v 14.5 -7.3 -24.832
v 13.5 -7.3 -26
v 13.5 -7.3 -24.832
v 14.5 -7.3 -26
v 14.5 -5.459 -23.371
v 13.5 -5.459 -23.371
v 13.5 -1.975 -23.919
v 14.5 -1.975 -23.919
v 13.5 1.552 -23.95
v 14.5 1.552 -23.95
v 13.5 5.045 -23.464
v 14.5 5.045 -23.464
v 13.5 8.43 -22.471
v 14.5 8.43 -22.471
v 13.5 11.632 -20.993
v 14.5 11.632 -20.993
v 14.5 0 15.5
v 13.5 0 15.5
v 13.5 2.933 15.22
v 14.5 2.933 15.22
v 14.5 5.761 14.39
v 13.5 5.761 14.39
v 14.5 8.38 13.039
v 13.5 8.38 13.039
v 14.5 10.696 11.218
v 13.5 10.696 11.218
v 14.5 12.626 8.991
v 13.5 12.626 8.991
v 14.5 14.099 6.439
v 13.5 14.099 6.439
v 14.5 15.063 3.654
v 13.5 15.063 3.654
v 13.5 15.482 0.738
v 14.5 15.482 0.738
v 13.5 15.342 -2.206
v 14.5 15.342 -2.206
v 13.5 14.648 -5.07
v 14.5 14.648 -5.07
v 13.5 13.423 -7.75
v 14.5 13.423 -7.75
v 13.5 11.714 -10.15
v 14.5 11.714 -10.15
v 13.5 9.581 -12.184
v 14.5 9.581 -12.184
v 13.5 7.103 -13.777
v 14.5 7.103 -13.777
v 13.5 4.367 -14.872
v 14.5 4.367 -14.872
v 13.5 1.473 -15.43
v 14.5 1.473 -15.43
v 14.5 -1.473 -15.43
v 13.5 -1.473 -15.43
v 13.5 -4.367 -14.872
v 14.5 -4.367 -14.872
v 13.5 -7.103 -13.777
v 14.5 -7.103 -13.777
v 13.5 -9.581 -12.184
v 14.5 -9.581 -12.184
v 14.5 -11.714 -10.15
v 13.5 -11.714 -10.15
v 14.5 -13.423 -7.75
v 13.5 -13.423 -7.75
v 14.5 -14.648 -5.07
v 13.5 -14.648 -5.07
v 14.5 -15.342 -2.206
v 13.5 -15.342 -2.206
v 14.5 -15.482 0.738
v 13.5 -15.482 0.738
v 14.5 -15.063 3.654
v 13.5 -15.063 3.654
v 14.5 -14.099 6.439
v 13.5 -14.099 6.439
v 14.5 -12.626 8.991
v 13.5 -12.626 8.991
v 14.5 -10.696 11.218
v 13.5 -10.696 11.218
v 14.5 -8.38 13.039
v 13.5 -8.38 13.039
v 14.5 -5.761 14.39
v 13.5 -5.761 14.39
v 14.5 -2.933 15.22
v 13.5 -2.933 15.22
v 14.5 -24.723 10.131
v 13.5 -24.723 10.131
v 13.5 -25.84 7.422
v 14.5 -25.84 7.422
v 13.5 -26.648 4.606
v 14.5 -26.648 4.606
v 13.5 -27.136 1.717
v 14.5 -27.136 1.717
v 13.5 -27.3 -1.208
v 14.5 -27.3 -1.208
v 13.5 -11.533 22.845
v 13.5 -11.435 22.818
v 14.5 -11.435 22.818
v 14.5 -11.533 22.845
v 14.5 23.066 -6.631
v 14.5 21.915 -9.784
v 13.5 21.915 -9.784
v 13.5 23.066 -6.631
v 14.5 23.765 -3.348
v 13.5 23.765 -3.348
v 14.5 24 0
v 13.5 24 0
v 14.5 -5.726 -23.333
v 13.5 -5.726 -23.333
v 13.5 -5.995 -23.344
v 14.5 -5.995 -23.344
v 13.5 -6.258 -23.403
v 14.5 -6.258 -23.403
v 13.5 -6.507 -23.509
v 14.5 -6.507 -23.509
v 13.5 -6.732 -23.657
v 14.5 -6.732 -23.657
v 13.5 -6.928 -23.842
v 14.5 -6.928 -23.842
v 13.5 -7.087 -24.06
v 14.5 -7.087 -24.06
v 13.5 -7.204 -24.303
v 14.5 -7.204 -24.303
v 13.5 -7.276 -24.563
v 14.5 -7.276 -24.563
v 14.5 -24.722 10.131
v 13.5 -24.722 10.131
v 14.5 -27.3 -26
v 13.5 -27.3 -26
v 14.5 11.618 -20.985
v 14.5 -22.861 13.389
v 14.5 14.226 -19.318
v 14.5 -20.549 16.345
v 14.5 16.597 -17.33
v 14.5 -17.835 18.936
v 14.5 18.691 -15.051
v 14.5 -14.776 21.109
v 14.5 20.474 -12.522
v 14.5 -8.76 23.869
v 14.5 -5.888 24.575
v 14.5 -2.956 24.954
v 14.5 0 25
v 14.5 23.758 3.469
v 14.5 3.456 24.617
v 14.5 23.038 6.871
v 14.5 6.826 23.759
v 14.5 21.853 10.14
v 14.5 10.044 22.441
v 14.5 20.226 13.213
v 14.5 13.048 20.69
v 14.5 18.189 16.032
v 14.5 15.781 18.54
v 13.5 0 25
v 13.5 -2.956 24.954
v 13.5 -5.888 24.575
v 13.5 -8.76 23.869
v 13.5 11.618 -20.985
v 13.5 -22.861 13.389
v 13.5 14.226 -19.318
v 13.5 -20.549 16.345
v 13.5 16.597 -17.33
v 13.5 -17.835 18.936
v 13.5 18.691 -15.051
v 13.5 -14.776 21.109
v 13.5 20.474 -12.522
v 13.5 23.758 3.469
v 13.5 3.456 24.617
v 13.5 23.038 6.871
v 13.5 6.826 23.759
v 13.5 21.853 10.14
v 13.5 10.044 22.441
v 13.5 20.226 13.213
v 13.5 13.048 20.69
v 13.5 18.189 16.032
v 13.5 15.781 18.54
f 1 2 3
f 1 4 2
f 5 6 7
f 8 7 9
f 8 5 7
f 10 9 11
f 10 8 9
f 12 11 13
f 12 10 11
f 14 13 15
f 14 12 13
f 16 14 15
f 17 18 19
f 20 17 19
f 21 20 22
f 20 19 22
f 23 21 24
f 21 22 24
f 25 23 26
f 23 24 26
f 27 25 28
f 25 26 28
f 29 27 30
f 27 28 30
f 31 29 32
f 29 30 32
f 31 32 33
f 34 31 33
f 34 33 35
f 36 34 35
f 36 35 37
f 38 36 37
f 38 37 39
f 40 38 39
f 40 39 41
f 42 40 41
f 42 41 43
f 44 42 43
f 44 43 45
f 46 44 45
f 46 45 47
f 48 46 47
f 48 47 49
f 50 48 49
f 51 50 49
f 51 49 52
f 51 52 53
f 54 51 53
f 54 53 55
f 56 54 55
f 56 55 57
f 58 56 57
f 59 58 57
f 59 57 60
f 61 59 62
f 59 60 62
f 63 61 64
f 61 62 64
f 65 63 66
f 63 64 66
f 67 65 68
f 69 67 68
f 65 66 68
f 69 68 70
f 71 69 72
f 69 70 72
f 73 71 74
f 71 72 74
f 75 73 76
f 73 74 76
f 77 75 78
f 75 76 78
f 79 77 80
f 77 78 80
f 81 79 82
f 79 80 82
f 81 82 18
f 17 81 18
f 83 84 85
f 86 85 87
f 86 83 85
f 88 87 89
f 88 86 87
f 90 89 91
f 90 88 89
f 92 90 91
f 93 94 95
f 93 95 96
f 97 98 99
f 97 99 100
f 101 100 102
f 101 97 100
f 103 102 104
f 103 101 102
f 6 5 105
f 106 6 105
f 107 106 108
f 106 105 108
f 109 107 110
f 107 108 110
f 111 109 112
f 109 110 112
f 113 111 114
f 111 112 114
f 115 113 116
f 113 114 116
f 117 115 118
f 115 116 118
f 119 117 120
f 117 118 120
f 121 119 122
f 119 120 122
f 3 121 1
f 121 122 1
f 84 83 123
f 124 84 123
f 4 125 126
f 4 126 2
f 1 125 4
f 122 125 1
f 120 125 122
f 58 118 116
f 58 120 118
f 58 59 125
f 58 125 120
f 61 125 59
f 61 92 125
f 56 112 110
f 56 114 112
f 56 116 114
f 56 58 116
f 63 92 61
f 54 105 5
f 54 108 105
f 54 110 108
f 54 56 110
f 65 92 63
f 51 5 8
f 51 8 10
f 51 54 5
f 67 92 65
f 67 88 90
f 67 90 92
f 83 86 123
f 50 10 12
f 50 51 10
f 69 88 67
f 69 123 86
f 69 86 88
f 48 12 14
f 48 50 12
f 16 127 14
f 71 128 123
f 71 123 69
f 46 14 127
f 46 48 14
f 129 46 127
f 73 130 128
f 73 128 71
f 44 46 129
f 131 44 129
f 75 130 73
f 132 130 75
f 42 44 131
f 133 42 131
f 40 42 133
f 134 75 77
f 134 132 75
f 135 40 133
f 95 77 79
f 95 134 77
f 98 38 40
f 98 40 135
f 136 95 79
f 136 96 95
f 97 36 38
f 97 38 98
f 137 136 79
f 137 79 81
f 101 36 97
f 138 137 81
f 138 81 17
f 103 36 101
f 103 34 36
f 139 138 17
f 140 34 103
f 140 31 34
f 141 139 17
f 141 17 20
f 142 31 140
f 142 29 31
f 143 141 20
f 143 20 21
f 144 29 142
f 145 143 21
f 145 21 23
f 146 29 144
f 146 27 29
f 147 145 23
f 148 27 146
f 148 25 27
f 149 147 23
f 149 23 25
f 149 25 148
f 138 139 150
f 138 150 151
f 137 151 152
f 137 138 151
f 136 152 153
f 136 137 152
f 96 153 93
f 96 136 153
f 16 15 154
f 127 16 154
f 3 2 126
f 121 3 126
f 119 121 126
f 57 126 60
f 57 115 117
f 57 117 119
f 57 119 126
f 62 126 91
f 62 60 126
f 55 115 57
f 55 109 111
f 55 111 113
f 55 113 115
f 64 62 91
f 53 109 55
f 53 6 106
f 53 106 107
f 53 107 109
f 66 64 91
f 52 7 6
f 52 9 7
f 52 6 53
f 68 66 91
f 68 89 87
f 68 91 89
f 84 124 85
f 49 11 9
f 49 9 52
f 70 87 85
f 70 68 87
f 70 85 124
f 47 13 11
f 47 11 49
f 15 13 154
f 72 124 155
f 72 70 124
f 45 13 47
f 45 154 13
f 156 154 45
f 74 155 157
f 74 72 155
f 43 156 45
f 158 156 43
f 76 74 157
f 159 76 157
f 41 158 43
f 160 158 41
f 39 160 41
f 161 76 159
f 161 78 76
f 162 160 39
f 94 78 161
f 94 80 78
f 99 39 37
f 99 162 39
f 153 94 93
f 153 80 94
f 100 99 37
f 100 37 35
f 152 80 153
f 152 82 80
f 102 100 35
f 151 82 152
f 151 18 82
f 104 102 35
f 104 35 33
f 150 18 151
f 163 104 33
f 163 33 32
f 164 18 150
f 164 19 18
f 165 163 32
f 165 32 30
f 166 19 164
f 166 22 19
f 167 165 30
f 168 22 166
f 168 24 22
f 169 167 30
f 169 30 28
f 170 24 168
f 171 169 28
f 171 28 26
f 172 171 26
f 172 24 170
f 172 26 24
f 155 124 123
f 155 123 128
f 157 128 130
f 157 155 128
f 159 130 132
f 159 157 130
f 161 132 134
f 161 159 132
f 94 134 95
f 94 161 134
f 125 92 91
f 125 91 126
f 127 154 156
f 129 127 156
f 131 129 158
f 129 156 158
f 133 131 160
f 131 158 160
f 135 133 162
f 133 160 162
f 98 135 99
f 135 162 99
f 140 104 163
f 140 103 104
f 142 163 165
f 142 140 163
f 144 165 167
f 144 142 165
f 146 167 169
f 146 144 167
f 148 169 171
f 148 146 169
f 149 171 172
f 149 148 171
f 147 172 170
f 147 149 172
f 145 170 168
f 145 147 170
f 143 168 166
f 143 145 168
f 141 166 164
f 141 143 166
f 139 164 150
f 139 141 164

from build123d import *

# Parameters (mm, degrees)
BOSS_EXTRUDE1_DEPTH               = 11.5
BOSS_EXTRUDE2_DEPTH               = 11.5
SKETCH3_W                         = 11.5
SKETCH3_H                         = 20
BOSS_EXTRUDE3_DEPTH               = 2.000101203
CUT_EXTRUDE1_DEPTH                = 10.5
BOSS_EXTRUDE4_DEPTH               = 2
BOSS_EXTRUDE5_DEPTH               = 1
CUT_EXTRUDE2_DEPTH                = 10.5
CUT_EXTRUDE3_DEPTH                = 2
CUT_EXTRUDE4_DEPTH                = 0.5
CUT_EXTRUDE5_DEPTH                = 0.5
CUT_EXTRUDE6_DEPTH                = 0.5
CUT_EXTRUDE7_DEPTH                = 0.5
CUT_EXTRUDE8_DEPTH                = 0.5
CUT_EXTRUDE9_DEPTH                = 0.5
CUT_EXTRUDE10_DEPTH               = 0.5
CUT_EXTRUDE11_DEPTH               = 0.5
SKETCH17_W                        = 0.1
SKETCH17_H                        = 10.000000149
F_3_5_3_5_DIAMETER_HOLE1_D        = 3.5
F_3_5_3_5_DIAMETER_HOLE1_DEPTH    = 14.5
TAP_DRILL_FOR_M30_HELICOIL1_D     = 31
TAP_DRILL_FOR_M30_HELICOIL1_DEPTH = 1
FILLET1_R                         = 1.5
FILLET2_R                         = 2.5
SKETCH22_W                        = 77.458890367
SKETCH22_H                        = 66.182059073
CUT_EXTRUDE12_DEPTH               = 22
CUT_EXTRUDE13_DEPTH               = 22


with BuildPart() as part:
    # Sketch1 → Boss-Extrude1 (new body)
    with BuildSketch(Plane(origin=(14.5, 0, 0), x_dir=(0, 0, -1), z_dir=(1, 0, 0))):
        with BuildLine():
            Line((23.999898797, -14.052218991), (23.999898797, -7.3))
            Line((23.999898797, -7.3), (22.862851966, -7.3))
            ThreePointArc((22.862851966, -7.3), (23.515848466, 4.796339325), (18.177699617, 15.670712703))
            Line((18.177699617, 15.670712703), (20.247987256, 18.013406611))
            ThreePointArc((20.247987256, 18.013406611), (19.986593389, 22.247987256), (15.752012744, 21.986593389))
            Line((15.752012744, 21.986593389), (13.722435262, 19.689966239))
            ThreePointArc((13.722435262, 19.689966239), (7.191690005, 22.897152549), (0, 24))
            ThreePointArc((0, 24), (-17.327723451, 17.028878595), (-25, 0))
            ThreePointArc((-25, 0), (-23.695001808, -9.306968083), (-19.193077259, -17.556534771))
            Line((-19.193077259, -17.556534771), (-22.247987256, -21.013406611))
            ThreePointArc((-22.247987256, -21.013406611), (-21.986593389, -25.247987256), (-17.752012744, -24.986593389))
            Line((-17.752012744, -24.986593389), (-14.906270141, -21.766410971))
            ThreePointArc((-14.906270141, -21.766410971), (6.309457693, -26.79912492), (23.999898797, -14.052218991))
        make_face()
    extrude(amount=-BOSS_EXTRUDE1_DEPTH)

    # Sketch2 → Boss-Extrude2 (add)
    with BuildSketch(Plane(origin=(14.5, 0, 0), x_dir=(0, 0, -1), z_dir=(1, 0, 0))):
        with BuildLine():
            Line((1.208, -27.3), (23.999898797, -27.3))
            Line((23.999898797, -27.3), (23.999898797, -14.052218991))
            ThreePointArc((23.999898797, -14.052218991), (14.389183107, -23.747481674), (1.208, -27.3))
        make_face()
    extrude(amount=-BOSS_EXTRUDE2_DEPTH)

    # Sketch3 → Boss-Extrude3 (add)
    with BuildSketch(Plane(origin=(0, 0, -23.999898797), x_dir=(-1, 0, 0), z_dir=(0, 0, -1))):
        with Locations((-8.75, -17.3)):
            Rectangle(SKETCH3_W, SKETCH3_H)
    extrude(amount=BOSS_EXTRUDE3_DEPTH)

    # Sketch4 → Cut-Extrude1 (cut)
    with BuildSketch(Plane.ZY.offset(-3)):
        with BuildLine():
            Line((-2, 22.912878475), (-2, 11))
            Line((-2, 11), (2.00000006, 11))
            Line((2.00000006, 11), (2.00000006, 22.916594135))
            ThreePointArc((2.00000006, 22.916594135), (1.000869219, 22.979139476), (0, 23))
            ThreePointArc((0, 23), (-1.00094832, 22.978209296), (-2, 22.912878475))
        make_face()
    extrude(amount=-CUT_EXTRUDE1_DEPTH, mode=Mode.SUBTRACT)

    # Sketch5 → Boss-Extrude4 (add)
    with BuildSketch(Plane.ZY.offset(-3)):
        with BuildLine():
            Line((-2, 23.916521486), (-2, 11))
            Line((-2, 11), (2.00000006, 11))
            Line((2.00000006, 11), (2.00000006, 23.919938516))
            ThreePointArc((2.00000006, 23.919938516), (18.03582173, 16.321347476), (25, 0))
            ThreePointArc((25, 0), (23.695001808, -9.306968083), (19.193077259, -17.556534771))
            Line((19.193077259, -17.556534771), (22.247987256, -21.013406611))
            ThreePointArc((22.247987256, -21.013406611), (21.986593389, -25.247987256), (17.752012744, -24.986593389))
            Line((17.752012744, -24.986593389), (14.906270141, -21.766410971))
            ThreePointArc((14.906270141, -21.766410971), (7.31095401, -25.878060536), (-1.208, -27.3))
            Line((-1.208, -27.3), (-26, -27.3))
            Line((-26, -27.3), (-26, -7.3))
            Line((-26, -7.3), (-22.862851966, -7.3))
            ThreePointArc((-22.862851966, -7.3), (-23.515848466, 4.796339325), (-18.177699617, 15.670712703))
            Line((-18.177699617, 15.670712703), (-20.247987256, 18.013406611))
            ThreePointArc((-20.247987256, 18.013406611), (-19.986593389, 22.247987256), (-15.752012744, 21.986593389))
            Line((-15.752012744, 21.986593389), (-13.722435262, 19.689966239))
            ThreePointArc((-13.722435262, 19.689966239), (-8.140312338, 22.577318597), (-2, 23.916521486))
        make_face()
    extrude(amount=BOSS_EXTRUDE4_DEPTH)

    # Sketch6 → Boss-Extrude5 (add)
    with BuildSketch(Plane.ZY.offset(-1)):
        with BuildLine():
            Line((-2, 23.916521486), (-2, 11))
            Line((-2, 11), (2.00000006, 11))
            Line((2.00000006, 11), (2.00000006, 23.919938516))
            ThreePointArc((2.00000006, 23.919938516), (18.03582173, 16.321347476), (25, 0))
            ThreePointArc((25, 0), (23.695001808, -9.306968083), (19.193077259, -17.556534771))
            Line((19.193077259, -17.556534771), (22.247987256, -21.013406611))
            ThreePointArc((22.247987256, -21.013406611), (21.986593389, -25.247987256), (17.752012744, -24.986593389))
            Line((17.752012744, -24.986593389), (14.906270141, -21.766410971))
            ThreePointArc((14.906270141, -21.766410971), (7.31095401, -25.878060536), (-1.208, -27.3))
            Line((-1.208, -27.3), (-26, -27.3))
            Line((-26, -27.3), (-26, -7.3))
            Line((-26, -7.3), (-22.862851966, -7.3))
            ThreePointArc((-22.862851966, -7.3), (-23.515848466, 4.796339325), (-18.177699617, 15.670712703))
            Line((-18.177699617, 15.670712703), (-20.247987256, 18.013406611))
            ThreePointArc((-20.247987256, 18.013406611), (-19.986593389, 22.247987256), (-15.752012744, 21.986593389))
            Line((-15.752012744, 21.986593389), (-13.722435262, 19.689966239))
            ThreePointArc((-13.722435262, 19.689966239), (-8.140312338, 22.577318597), (-2, 23.916521486))
        make_face()
    extrude(amount=BOSS_EXTRUDE5_DEPTH)

    # Sketch7 → Cut-Extrude2 (cut)
    with BuildSketch(Plane(origin=(13.5, 0, 0), x_dir=(0, 0, -1), z_dir=(1, 0, 0))):
        with BuildLine():
            Line((2, 22.912878475), (2, 11))
            Line((2, 11), (-2.00000006, 11))
            Line((-2.00000006, 11), (-2.00000006, 22.916594135))
            ThreePointArc((-2.00000006, 22.916594135), (-17.342759411, 15.599308966), (-24.000832639, -0.040799334))
            ThreePointArc((-24.000832639, -0.040799334), (-16.992486688, -18.54262722), (1.208, -26.3))
            Line((1.208, -26.3), (26, -26.3))
            Line((26, -26.3), (26, -8.3))
            Line((26, -8.3), (21.450174824, -8.3))
            ThreePointArc((21.450174824, -8.3), (19.520210565, 12.163937664), (2, 22.912878475))
        make_face()
    extrude(amount=-CUT_EXTRUDE2_DEPTH, mode=Mode.SUBTRACT)

    # Sketch8 → Cut-Extrude3 (cut)
    with BuildSketch(Plane(origin=(3, 0, 0), x_dir=(0, 0, -1), z_dir=(1, 0, 0))):
        with BuildLine():
            Line((2, 22.912878475), (2, 11))
            Line((2, 11), (-2.00000006, 11))
            Line((-2.00000006, 11), (-2.00000006, 22.916594135))
            ThreePointArc((-2.00000006, 22.916594135), (-17.342759411, 15.599308966), (-24.000832639, -0.040799334))
            ThreePointArc((-24.000832639, -0.040799334), (-16.992486688, -18.54262722), (1.208, -26.3))
            Line((1.208, -26.3), (26, -26.3))
            Line((26, -26.3), (26, -8.3))
            Line((26, -8.3), (21.450174824, -8.3))
            ThreePointArc((21.450174824, -8.3), (19.520210565, 12.163937664), (2, 22.912878475))
        make_face()
    extrude(amount=-CUT_EXTRUDE3_DEPTH, mode=Mode.SUBTRACT)

    # Sketch9 → Cut-Extrude4 (cut)
    with BuildSketch(Plane.ZY):
        with BuildLine():
            Line((-0.5, -22.994564575), (-0.5, -10.988630488))
            ThreePointArc((-0.5, -10.988630488), (-4.209517756, -10.162674858), (-7.416581743, -8.123688525))
            Line((-7.416581743, -8.123688525), (-15.906059151, -16.613165932))
            ThreePointArc((-15.906059151, -16.613165932), (-8.801718944, -21.249229248), (-0.5, -22.994564575))
        make_face()
    extrude(amount=-CUT_EXTRUDE4_DEPTH, mode=Mode.SUBTRACT)

    # Sketch10 → Cut-Extrude5 (cut)
    with BuildSketch(Plane.ZY):
        with BuildLine():
            Line((-15.906059151, 16.613165932), (-7.416581743, 8.123688525))
            ThreePointArc((-7.416581743, 8.123688525), (-5.351481429, 9.610496684), (-3, 10.583005244))
            Line((-3, 10.583005244), (-3, 22.803508502))
            ThreePointArc((-3, 22.803508502), (-9.946851433, 20.737891565), (-15.906059151, 16.613165932))
        make_face()
    extrude(amount=-CUT_EXTRUDE5_DEPTH, mode=Mode.SUBTRACT)

    # Sketch11 → Cut-Extrude6 (cut)
    with BuildSketch(Plane.ZY):
        with BuildLine():
            Line((16.613165932, 15.906059151), (8.123688525, 7.416581743))
            ThreePointArc((8.123688525, 7.416581743), (10.162674858, 4.209517756), (10.988630488, 0.5))
            Line((10.988630488, 0.5), (22.994564575, 0.5))
            ThreePointArc((22.994564575, 0.5), (21.249229248, 8.801718944), (16.613165932, 15.906059151))
        make_face()
    extrude(amount=-CUT_EXTRUDE6_DEPTH, mode=Mode.SUBTRACT)

    # Sketch12 → Cut-Extrude7 (cut)
    with BuildSketch(Plane.ZY):
        with BuildLine():
            Line((-16.613165932, -15.906059151), (-8.123688525, -7.416581743))
            ThreePointArc((-8.123688525, -7.416581743), (-10.162674858, -4.209517756), (-10.988630488, -0.5))
            Line((-10.988630488, -0.5), (-22.994564575, -0.5))
            ThreePointArc((-22.994564575, -0.5), (-21.249229248, -8.801718944), (-16.613165932, -15.906059151))
        make_face()
    extrude(amount=-CUT_EXTRUDE7_DEPTH, mode=Mode.SUBTRACT)

    # Sketch13 → Cut-Extrude8 (cut)
    with BuildSketch(Plane.ZY):
        with BuildLine():
            Line((15.906059151, -16.613165932), (7.416581743, -8.123688525))
            ThreePointArc((7.416581743, -8.123688525), (4.209517756, -10.162674858), (0.5, -10.988630488))
            Line((0.5, -10.988630488), (0.5, -22.994564575))
            ThreePointArc((0.5, -22.994564575), (8.801718944, -21.249229248), (15.906059151, -16.613165932))
        make_face()
    extrude(amount=-CUT_EXTRUDE8_DEPTH, mode=Mode.SUBTRACT)

    # Sketch14 → Cut-Extrude9 (cut)
    with BuildSketch(Plane.ZY):
        with BuildLine():
            Line((3, 22.803508502), (3, 10.583005244))
            ThreePointArc((3, 10.583005244), (5.351481429, 9.610496684), (7.416581743, 8.123688525))
            Line((7.416581743, 8.123688525), (15.906059151, 16.613165932))
            ThreePointArc((15.906059151, 16.613165932), (9.946851433, 20.737891565), (3, 22.803508502))
        make_face()
    extrude(amount=-CUT_EXTRUDE9_DEPTH, mode=Mode.SUBTRACT)

    # Sketch15 → Cut-Extrude10 (cut)
    with BuildSketch(Plane.ZY):
        with BuildLine():
            Line((8.123688525, -7.416581743), (16.613165932, -15.906059151))
            ThreePointArc((16.613165932, -15.906059151), (21.249229248, -8.801718944), (22.994564575, -0.5))
            Line((22.994564575, -0.5), (10.988630488, -0.5))
            ThreePointArc((10.988630488, -0.5), (10.162674858, -4.209517756), (8.123688525, -7.416581743))
        make_face()
    extrude(amount=-CUT_EXTRUDE10_DEPTH, mode=Mode.SUBTRACT)

    # Sketch16 → Cut-Extrude11 (cut)
    with BuildSketch(Plane.ZY):
        with BuildLine():
            Line((-22.994564575, 0.5), (-10.988630488, 0.5))
            ThreePointArc((-10.988630488, 0.5), (-10.162674858, 4.209517756), (-8.123688525, 7.416581743))
            Line((-8.123688525, 7.416581743), (-16.613165932, 15.906059151))
            ThreePointArc((-16.613165932, 15.906059151), (-21.249229248, 8.801718944), (-22.994564575, 0.5))
        make_face()
    extrude(amount=-CUT_EXTRUDE11_DEPTH, mode=Mode.SUBTRACT)

    # Sketch17 → Cut-Revolve1 (revolve, cut)
    with BuildSketch(Plane(origin=(0, 0, 0), x_dir=(1, 0, 0), z_dir=(0, 1, 0))):
        with Locations((0.05, 5.000000074)):
            Rectangle(SKETCH17_W, SKETCH17_H)
    revolve(axis=Axis((0, 0, 0), (1, 0, 0)), mode=Mode.SUBTRACT)

    # Ø3.5 (3.5) Diameter Hole1
    with Locations(Plane.ZY):
        with Locations((-18, 20), (20, -23)):
            Hole(F_3_5_3_5_DIAMETER_HOLE1_D / 2, depth=F_3_5_3_5_DIAMETER_HOLE1_DEPTH)

    # Tap Drill for M30 Helicoil1
    with Locations(Plane(origin=(14.5, 0, 0), x_dir=(0, 0, -1), z_dir=(1, 0, 0))):
        with Locations((0, 0)):
            Hole(TAP_DRILL_FOR_M30_HELICOIL1_D / 2, depth=TAP_DRILL_FOR_M30_HELICOIL1_DEPTH)

    # Fillet1
    fillet1_edges = [part.edges().sort_by_distance(p)[0] for p in [
        (7.25, -7.3, -22.862851966),
    ]]
    fillet(fillet1_edges, radius=FILLET1_R)

    # Fillet2
    fillet2_edges = [part.edges().sort_by_distance(p)[0] for p in [
        (7.25, -8.3, -21.450174824),
        (7.25, -21.766410971, 14.906270141),
        (7.25, -17.556534771, 19.193077259),
        (7.25, 19.689966239, -13.722435262),
        (7.25, 15.670712703, -18.177699617),
    ]]
    fillet(fillet2_edges, radius=FILLET2_R)

    # Sketch22 → Cut-Extrude12 (cut)
    with BuildSketch(Plane.ZY.offset(-13.5)):
        with Locations((3.746075582, -1.742433044)):
            Rectangle(SKETCH22_W, SKETCH22_H)
    extrude(amount=CUT_EXTRUDE12_DEPTH, mode=Mode.SUBTRACT)

    # Sketch23 → Cut-Extrude13 (cut)
    with BuildSketch(Plane.ZY.offset(-13.5)):
        with BuildLine():
            Line((22.818301287, -11.435112892), (26.703674286, -25.778443436))
            Line((26.703674286, -25.778443436), (15.434056464, -28.831198071))
            Line((15.434056464, -28.831198071), (10.130861555, -24.722456157))
            ThreePointArc((10.130861555, -24.722456157), (17.689338268, -19.238696929), (22.818301287, -11.435112892))
        make_face()
        with BuildLine():
            Line((-9.783782243, 21.915234873), (-19.266917552, 25.788568278))
            Line((-19.266917552, 25.788568278), (-25.363017774, 18.892979502))
            Line((-25.363017774, 18.892979502), (-20.984828091, 11.618400961))
            ThreePointArc((-20.984828091, 11.618400961), (-16.224389467, 17.68067385), (-9.783782243, 21.915234873))
        make_face()
    extrude(amount=-CUT_EXTRUDE13_DEPTH, mode=Mode.SUBTRACT)


solid = part.part
